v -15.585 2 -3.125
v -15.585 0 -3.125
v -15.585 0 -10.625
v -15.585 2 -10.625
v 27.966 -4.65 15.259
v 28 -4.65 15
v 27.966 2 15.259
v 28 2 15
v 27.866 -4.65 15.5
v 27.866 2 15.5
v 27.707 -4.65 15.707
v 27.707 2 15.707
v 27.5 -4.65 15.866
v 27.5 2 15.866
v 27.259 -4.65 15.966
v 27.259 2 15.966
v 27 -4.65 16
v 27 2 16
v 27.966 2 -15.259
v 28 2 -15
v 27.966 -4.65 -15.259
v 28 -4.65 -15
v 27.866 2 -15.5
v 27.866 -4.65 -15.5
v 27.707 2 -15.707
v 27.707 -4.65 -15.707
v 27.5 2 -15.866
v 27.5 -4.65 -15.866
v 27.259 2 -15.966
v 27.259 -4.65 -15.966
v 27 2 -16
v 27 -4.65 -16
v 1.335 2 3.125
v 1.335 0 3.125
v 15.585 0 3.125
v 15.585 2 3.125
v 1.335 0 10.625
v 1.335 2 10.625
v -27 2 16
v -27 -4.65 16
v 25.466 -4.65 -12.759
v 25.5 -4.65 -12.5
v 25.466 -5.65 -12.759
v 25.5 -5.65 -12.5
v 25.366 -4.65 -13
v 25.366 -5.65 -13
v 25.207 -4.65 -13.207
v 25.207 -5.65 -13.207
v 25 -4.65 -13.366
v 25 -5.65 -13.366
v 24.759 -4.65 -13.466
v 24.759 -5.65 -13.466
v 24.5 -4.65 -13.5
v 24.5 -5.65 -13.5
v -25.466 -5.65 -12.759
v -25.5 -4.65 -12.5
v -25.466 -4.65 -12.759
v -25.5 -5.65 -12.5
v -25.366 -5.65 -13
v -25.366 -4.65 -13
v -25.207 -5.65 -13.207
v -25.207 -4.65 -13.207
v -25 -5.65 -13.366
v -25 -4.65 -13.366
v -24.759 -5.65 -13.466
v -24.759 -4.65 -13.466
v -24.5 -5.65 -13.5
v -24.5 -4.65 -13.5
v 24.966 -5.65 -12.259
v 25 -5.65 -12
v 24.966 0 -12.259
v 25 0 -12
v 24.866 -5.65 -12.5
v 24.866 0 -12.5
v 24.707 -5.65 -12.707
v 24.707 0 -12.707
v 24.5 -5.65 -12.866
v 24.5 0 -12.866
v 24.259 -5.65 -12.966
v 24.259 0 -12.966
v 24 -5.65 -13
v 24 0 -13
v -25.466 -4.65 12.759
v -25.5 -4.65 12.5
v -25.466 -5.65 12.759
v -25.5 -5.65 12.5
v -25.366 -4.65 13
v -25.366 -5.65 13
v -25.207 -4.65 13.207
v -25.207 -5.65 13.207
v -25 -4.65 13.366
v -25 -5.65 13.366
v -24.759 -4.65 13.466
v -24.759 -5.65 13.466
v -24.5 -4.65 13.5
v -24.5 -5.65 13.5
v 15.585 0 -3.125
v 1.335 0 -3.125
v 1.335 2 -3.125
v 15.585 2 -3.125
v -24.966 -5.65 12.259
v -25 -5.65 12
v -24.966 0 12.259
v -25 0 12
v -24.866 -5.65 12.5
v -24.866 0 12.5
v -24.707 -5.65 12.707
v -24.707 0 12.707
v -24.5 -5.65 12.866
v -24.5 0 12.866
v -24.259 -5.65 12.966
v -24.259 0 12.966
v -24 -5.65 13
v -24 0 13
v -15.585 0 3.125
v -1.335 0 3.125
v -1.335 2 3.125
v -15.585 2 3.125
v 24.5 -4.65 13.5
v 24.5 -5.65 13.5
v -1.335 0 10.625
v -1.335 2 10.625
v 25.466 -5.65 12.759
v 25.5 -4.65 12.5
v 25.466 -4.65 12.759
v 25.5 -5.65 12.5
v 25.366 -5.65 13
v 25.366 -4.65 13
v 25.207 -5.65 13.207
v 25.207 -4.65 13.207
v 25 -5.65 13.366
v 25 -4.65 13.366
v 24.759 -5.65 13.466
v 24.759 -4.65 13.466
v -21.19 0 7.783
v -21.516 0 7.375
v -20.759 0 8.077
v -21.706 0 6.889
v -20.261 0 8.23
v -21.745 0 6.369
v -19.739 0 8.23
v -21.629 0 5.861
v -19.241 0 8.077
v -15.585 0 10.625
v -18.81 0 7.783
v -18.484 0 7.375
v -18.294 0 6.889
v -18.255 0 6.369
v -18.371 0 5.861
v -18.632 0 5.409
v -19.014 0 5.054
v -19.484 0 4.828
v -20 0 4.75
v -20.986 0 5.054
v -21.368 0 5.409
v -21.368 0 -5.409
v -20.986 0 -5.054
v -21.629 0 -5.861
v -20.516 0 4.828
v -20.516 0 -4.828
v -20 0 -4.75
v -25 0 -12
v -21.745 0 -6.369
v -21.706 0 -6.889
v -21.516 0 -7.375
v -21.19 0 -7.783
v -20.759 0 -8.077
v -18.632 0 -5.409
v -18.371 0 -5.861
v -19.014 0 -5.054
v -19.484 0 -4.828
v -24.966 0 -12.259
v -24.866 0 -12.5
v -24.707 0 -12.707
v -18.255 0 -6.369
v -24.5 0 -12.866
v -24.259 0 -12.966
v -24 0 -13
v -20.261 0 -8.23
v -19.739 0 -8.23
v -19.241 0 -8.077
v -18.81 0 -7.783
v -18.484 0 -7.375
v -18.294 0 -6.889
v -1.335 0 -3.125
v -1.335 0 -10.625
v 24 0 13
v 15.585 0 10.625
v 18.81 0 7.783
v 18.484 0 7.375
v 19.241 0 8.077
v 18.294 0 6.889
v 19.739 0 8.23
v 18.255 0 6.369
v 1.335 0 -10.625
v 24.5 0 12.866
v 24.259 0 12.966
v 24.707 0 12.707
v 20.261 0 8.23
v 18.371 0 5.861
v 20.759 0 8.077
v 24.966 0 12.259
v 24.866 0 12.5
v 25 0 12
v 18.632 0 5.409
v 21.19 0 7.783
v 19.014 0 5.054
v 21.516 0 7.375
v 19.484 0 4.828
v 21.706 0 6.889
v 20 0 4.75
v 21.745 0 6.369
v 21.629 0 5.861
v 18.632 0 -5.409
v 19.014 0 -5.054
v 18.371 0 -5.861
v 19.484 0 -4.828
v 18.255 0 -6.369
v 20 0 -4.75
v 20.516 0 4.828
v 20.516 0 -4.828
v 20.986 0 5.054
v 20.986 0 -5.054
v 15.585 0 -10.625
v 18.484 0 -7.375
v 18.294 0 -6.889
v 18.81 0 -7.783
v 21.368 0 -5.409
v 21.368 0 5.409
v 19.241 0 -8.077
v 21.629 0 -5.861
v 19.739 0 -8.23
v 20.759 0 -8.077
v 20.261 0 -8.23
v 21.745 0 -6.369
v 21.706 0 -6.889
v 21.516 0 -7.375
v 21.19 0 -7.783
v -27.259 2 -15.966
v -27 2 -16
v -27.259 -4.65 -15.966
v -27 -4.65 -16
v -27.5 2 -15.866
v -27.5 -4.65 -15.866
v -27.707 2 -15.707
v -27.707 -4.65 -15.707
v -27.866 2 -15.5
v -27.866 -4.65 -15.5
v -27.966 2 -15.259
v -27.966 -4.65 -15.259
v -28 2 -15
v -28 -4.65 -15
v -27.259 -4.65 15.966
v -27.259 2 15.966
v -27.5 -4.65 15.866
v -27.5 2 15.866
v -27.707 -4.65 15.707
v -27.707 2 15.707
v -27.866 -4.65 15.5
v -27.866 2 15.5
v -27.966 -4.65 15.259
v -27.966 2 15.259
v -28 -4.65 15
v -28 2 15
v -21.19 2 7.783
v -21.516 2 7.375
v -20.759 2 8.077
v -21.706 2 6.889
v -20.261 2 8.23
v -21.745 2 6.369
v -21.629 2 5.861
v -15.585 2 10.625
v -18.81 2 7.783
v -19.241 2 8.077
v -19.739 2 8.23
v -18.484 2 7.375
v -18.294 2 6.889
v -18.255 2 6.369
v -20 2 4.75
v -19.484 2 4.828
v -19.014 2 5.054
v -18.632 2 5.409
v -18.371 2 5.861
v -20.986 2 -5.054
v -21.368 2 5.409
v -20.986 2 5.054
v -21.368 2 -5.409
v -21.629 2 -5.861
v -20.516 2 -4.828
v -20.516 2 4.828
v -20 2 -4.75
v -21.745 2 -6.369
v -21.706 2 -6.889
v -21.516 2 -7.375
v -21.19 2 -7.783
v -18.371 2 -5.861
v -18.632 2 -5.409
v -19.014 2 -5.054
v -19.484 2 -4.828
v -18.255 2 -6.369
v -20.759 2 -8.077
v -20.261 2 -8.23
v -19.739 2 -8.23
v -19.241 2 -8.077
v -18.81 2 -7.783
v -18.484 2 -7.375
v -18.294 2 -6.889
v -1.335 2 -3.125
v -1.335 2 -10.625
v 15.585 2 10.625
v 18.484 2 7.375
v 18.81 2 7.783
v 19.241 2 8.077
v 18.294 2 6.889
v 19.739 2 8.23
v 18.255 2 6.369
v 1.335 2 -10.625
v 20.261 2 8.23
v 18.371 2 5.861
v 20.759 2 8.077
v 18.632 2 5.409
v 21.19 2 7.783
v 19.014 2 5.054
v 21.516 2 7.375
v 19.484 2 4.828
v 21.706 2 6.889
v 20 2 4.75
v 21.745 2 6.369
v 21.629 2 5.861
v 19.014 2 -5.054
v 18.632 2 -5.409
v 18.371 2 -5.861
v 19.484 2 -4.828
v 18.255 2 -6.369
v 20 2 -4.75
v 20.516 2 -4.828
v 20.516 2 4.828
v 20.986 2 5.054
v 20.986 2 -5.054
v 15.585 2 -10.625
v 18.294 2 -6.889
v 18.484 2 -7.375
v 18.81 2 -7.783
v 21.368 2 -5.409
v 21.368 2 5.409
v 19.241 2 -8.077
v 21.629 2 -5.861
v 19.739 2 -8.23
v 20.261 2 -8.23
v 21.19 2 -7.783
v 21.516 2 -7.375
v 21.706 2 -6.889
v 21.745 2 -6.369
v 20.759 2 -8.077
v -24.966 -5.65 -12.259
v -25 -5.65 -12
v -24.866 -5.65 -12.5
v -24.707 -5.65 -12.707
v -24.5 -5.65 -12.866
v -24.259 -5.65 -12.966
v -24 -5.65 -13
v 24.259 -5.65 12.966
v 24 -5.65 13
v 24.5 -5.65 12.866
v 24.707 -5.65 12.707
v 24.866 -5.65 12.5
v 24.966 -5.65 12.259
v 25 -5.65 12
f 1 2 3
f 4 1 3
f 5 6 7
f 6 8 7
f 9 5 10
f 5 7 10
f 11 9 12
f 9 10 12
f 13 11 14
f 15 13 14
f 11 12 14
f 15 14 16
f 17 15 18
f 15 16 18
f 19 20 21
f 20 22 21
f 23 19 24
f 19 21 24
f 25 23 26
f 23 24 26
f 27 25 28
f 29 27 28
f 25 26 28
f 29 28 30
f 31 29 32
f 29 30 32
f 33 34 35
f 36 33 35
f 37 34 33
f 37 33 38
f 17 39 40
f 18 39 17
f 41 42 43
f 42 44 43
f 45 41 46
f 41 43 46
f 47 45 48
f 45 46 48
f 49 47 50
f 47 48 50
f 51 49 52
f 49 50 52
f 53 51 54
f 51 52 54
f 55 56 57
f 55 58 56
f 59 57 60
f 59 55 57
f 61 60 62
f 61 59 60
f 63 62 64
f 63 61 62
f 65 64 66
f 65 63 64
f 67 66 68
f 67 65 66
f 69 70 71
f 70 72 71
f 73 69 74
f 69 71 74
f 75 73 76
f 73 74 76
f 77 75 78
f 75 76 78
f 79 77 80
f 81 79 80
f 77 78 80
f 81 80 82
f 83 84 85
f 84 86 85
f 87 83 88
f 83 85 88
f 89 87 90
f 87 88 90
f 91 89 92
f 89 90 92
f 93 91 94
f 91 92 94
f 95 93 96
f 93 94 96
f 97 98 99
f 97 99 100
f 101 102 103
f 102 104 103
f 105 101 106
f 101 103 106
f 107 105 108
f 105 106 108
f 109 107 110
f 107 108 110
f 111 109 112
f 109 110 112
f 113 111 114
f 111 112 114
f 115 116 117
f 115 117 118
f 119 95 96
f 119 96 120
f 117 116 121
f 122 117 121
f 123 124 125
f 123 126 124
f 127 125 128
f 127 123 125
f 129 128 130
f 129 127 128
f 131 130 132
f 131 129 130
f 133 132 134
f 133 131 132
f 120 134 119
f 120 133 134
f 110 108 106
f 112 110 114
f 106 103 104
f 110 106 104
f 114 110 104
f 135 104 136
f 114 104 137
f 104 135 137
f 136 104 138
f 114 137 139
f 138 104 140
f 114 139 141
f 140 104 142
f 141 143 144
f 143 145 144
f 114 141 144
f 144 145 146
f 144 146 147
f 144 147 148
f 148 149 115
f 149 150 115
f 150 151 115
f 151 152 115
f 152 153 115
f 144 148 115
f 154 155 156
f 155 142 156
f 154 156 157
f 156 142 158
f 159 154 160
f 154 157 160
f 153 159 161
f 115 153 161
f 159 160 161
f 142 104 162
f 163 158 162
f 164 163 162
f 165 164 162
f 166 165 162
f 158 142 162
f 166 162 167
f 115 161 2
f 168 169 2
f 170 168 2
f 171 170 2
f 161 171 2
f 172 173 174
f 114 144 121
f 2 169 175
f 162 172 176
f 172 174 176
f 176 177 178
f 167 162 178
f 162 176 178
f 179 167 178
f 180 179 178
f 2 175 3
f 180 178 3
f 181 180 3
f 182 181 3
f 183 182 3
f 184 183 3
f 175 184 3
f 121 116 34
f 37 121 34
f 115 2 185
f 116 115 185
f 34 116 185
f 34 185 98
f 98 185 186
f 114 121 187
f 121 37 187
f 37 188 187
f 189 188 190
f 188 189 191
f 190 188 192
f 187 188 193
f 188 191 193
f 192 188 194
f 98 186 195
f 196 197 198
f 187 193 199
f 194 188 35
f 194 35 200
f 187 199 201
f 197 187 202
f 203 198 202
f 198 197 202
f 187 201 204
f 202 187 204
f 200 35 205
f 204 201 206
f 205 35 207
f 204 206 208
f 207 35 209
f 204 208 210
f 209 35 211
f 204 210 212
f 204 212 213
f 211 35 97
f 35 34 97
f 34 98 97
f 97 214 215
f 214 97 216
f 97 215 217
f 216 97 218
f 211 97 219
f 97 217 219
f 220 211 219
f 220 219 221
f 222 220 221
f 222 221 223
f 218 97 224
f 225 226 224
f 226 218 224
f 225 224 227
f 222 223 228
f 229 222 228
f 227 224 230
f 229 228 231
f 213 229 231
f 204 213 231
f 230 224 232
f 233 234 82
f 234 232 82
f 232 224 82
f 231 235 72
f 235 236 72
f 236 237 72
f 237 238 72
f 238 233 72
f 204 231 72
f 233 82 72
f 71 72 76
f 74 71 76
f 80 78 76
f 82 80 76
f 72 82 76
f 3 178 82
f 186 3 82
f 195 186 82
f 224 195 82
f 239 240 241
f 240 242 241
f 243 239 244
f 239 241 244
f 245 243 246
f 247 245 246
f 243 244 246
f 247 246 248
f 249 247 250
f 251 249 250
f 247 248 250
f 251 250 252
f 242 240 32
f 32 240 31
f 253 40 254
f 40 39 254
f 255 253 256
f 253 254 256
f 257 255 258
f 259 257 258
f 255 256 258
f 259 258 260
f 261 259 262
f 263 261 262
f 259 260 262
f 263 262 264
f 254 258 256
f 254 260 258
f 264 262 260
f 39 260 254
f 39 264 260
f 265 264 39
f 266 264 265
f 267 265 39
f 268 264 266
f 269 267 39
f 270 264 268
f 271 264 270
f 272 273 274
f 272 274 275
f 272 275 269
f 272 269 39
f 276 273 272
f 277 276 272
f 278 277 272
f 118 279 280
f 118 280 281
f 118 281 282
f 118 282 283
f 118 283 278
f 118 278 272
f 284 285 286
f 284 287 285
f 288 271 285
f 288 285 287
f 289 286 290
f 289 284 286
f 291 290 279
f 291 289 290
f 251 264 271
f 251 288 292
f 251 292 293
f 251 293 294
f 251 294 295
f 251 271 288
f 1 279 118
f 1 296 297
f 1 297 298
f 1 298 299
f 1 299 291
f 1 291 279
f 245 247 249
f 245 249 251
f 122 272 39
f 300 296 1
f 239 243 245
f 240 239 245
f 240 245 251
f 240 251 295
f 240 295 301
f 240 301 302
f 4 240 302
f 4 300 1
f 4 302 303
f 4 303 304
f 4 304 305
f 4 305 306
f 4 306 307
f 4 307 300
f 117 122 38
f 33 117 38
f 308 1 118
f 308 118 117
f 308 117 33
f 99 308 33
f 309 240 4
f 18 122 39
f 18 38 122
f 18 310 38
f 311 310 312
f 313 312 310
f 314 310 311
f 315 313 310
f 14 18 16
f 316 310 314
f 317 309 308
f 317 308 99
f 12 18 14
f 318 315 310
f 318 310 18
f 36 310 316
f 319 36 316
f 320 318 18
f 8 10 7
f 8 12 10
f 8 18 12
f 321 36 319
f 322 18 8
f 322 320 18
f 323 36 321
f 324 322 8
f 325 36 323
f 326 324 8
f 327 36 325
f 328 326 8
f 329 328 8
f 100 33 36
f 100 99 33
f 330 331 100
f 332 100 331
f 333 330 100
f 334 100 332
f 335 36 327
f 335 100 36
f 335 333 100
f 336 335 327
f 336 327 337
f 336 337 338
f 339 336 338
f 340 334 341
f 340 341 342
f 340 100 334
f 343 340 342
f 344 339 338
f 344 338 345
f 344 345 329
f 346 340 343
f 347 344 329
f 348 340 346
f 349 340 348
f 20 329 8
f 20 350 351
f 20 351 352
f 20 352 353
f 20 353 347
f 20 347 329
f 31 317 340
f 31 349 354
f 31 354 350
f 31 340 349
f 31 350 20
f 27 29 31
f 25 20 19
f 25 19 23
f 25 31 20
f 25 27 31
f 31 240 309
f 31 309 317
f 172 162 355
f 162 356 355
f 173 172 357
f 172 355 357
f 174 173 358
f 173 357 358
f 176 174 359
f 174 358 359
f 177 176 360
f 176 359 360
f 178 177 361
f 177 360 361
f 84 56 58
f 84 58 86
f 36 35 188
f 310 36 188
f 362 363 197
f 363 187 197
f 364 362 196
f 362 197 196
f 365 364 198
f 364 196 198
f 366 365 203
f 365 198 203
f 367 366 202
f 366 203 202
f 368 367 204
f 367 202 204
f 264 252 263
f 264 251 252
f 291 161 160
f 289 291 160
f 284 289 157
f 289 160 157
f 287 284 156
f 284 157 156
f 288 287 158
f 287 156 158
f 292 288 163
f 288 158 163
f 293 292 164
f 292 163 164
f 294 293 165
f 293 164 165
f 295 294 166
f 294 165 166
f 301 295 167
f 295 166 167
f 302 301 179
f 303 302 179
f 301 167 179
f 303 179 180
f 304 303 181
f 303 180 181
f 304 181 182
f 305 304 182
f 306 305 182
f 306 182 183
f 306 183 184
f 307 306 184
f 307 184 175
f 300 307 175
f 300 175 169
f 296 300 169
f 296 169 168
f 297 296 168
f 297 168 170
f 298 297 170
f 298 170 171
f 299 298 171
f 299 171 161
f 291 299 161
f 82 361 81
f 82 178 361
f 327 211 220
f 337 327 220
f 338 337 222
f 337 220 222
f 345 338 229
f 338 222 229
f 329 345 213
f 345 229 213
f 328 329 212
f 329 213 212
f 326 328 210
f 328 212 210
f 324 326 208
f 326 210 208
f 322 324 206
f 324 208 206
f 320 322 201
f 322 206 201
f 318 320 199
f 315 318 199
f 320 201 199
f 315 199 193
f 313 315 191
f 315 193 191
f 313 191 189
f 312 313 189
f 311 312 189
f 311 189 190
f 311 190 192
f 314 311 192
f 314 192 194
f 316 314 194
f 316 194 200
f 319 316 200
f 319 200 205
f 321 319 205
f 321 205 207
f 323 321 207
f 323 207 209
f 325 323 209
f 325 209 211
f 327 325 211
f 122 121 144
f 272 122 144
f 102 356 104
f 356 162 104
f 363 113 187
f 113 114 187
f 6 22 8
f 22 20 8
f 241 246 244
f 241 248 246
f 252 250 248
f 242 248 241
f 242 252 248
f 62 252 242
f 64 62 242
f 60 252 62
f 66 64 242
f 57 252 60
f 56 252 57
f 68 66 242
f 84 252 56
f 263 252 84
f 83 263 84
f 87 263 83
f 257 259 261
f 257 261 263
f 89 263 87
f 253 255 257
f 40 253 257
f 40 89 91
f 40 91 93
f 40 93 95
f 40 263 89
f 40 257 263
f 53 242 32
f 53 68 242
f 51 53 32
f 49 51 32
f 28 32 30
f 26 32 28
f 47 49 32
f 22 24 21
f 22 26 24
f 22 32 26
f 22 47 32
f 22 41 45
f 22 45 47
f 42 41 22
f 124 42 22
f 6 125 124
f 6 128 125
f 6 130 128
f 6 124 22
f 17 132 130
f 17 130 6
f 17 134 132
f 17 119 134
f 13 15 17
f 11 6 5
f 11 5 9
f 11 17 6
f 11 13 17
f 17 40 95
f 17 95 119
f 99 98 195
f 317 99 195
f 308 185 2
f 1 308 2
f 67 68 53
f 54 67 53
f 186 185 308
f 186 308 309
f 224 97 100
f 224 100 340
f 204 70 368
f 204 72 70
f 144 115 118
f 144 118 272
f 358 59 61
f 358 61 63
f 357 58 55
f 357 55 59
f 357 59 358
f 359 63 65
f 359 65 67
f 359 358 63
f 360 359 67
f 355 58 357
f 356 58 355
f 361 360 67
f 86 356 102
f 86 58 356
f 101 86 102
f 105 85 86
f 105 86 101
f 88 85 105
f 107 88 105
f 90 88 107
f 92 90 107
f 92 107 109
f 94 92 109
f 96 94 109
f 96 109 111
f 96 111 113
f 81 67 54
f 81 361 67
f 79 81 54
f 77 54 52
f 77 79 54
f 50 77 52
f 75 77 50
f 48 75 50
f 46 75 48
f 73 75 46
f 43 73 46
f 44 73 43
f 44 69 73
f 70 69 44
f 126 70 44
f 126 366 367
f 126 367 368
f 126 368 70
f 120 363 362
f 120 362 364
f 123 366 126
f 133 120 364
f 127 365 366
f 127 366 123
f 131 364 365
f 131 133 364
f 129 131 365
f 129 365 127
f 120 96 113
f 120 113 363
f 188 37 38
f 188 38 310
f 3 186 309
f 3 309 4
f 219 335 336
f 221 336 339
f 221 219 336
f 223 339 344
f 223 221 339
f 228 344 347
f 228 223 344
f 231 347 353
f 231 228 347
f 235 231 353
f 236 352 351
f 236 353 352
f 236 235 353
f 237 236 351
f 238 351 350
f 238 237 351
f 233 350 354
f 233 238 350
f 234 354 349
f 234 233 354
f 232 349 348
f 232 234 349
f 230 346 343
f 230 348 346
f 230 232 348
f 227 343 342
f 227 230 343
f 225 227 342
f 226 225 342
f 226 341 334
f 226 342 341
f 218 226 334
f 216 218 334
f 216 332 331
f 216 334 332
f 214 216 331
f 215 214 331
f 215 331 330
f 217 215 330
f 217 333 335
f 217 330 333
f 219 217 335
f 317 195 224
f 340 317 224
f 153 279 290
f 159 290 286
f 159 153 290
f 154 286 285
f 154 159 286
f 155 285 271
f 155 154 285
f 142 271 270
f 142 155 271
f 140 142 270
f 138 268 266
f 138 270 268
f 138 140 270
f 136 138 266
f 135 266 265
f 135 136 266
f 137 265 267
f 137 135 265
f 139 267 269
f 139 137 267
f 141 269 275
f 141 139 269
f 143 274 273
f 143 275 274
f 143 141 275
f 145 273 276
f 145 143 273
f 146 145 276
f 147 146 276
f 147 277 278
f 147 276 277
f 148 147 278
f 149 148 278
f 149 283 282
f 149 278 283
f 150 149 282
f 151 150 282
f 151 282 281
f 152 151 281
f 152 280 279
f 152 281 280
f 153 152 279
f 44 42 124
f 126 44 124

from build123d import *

# Parameters (mm, degrees)
SKETCH1_W               = 56
SKETCH1_H               = 32
BOSS_EXTRUDE1_DEPTH     = 2
SKETCH2_R               = 1.75
CUT_EXTRUDE1_DEPTH      = 33.310988843
MIRROR2_COPY_1_SKETCH_R = 1.75
MIRROR2_COPY_1_DEPTH    = 33.310988843
SKETCH4_W               = 14.25
SKETCH4_H               = 7.5
CUT_EXTRUDE2_DEPTH      = 33.310988843
MIRROR4_COPY_1_SKETCH_W = 14.25
MIRROR4_COPY_1_SKETCH_H = 7.5
MIRROR4_COPY_1_DEPTH    = 33.310988843
SKETCH5_W               = 56
SKETCH5_H               = 32
SKETCH5_W_2             = 50
SKETCH5_H_2             = 26
BOSS_EXTRUDE2_DEPTH     = 4.65
SKETCH6_W               = 51
SKETCH6_H               = 27
SKETCH6_W_2             = 50
SKETCH6_H_2             = 26
BOSS_EXTRUDE3_DEPTH     = 1
FILLET1_R               = 1


with BuildPart() as part:
    # Sketch1 → Boss-Extrude1 (new body)
    with BuildSketch(Plane(origin=(0, 0, 0), x_dir=(1, 0, 0), z_dir=(0, 1, 0))):
        Rectangle(SKETCH1_W, SKETCH1_H)
    extrude(amount=BOSS_EXTRUDE1_DEPTH)

    # Sketch2 → Cut-Extrude1 (cut, through all)
    with BuildSketch(Plane(origin=(0, 0, 0), x_dir=(1, 0, 0), z_dir=(0, 1, 0))):
        with Locations(Location((20, 6.5, 0), (0, 0, 270))):
            Circle(SKETCH2_R)
    cut_extrude1 = extrude(amount=CUT_EXTRUDE1_DEPTH, mode=Mode.SUBTRACT)

    # Mirror1: Cut-Extrude1 across plane
    add(cut_extrude1.mirror(Plane.XY), mode=Mode.SUBTRACT)

    # Mirror2: Cut-Extrude1 across plane
    add(cut_extrude1.mirror(Plane(origin=(0, 0, 0), x_dir=(0, 0, 1), z_dir=(1, 0, 0))), mode=Mode.SUBTRACT)

    # Mirror2 copy 1 sketch → Mirror2 copy 1 (cut, through all)
    with BuildSketch(Plane(origin=(0, 0, 0), x_dir=(-1, 0, 0), z_dir=(0, 1, 0))):
        with Locations(Location((20, 6.5, 0), (0, 0, 270))):
            Circle(MIRROR2_COPY_1_SKETCH_R)
    extrude(amount=MIRROR2_COPY_1_DEPTH, mode=Mode.SUBTRACT)

    # Sketch4 → Cut-Extrude2 (cut, through all)
    with BuildSketch(Plane(origin=(0, 0, 0), x_dir=(1, 0, 0), z_dir=(0, 1, 0))):
        with Locations((8.46, 6.875)):
            Rectangle(SKETCH4_W, SKETCH4_H)
    cut_extrude2 = extrude(amount=CUT_EXTRUDE2_DEPTH, mode=Mode.SUBTRACT)

    # Mirror3: Cut-Extrude2 across plane
    add(cut_extrude2.mirror(Plane(origin=(0, 0, 0), x_dir=(0, 0, 1), z_dir=(1, 0, 0))), mode=Mode.SUBTRACT)

    # Mirror4: Cut-Extrude2 across plane
    add(cut_extrude2.mirror(Plane.XY), mode=Mode.SUBTRACT)

    # Mirror4 copy 1 sketch → Mirror4 copy 1 (cut, through all)
    with BuildSketch(Plane(origin=(0, 0, 0), x_dir=(-1, 0, 0), z_dir=(0, 1, 0))):
        with Locations((8.46, 6.875)):
            Rectangle(MIRROR4_COPY_1_SKETCH_W, MIRROR4_COPY_1_SKETCH_H)
    extrude(amount=MIRROR4_COPY_1_DEPTH, mode=Mode.SUBTRACT)

    # Sketch5 → Boss-Extrude2 (add)
    with BuildSketch(Plane.XZ):
        Rectangle(SKETCH5_W, SKETCH5_H)
        Rectangle(SKETCH5_W_2, SKETCH5_H_2, mode=Mode.SUBTRACT)
    extrude(amount=BOSS_EXTRUDE2_DEPTH)

    # Sketch6 → Boss-Extrude3 (add)
    with BuildSketch(Plane.XZ.offset(4.65)):
        Rectangle(SKETCH6_W, SKETCH6_H)
        Rectangle(SKETCH6_W_2, SKETCH6_H_2, mode=Mode.SUBTRACT)
    extrude(amount=BOSS_EXTRUDE3_DEPTH)

    # Fillet1
    fillet1_edges = [part.edges().sort_by_distance(p)[0] for p in [
        (-25.5, -5.15, -13.5),
        (25.5, -5.15, -13.5),
        (25.5, -5.15, 13.5),
        (-25.5, -5.15, 13.5),
        (28, -1.325, 16),
        (-28, -1.325, 16),
        (-28, -1.325, -16),
        (28, -1.325, -16),
        (25, -2.825, -13),
        (25, -2.825, 13),
        (-25, -2.825, 13),
        (-25, -2.825, -13),
    ]]
    fillet(fillet1_edges, radius=FILLET1_R)


solid = part.part
